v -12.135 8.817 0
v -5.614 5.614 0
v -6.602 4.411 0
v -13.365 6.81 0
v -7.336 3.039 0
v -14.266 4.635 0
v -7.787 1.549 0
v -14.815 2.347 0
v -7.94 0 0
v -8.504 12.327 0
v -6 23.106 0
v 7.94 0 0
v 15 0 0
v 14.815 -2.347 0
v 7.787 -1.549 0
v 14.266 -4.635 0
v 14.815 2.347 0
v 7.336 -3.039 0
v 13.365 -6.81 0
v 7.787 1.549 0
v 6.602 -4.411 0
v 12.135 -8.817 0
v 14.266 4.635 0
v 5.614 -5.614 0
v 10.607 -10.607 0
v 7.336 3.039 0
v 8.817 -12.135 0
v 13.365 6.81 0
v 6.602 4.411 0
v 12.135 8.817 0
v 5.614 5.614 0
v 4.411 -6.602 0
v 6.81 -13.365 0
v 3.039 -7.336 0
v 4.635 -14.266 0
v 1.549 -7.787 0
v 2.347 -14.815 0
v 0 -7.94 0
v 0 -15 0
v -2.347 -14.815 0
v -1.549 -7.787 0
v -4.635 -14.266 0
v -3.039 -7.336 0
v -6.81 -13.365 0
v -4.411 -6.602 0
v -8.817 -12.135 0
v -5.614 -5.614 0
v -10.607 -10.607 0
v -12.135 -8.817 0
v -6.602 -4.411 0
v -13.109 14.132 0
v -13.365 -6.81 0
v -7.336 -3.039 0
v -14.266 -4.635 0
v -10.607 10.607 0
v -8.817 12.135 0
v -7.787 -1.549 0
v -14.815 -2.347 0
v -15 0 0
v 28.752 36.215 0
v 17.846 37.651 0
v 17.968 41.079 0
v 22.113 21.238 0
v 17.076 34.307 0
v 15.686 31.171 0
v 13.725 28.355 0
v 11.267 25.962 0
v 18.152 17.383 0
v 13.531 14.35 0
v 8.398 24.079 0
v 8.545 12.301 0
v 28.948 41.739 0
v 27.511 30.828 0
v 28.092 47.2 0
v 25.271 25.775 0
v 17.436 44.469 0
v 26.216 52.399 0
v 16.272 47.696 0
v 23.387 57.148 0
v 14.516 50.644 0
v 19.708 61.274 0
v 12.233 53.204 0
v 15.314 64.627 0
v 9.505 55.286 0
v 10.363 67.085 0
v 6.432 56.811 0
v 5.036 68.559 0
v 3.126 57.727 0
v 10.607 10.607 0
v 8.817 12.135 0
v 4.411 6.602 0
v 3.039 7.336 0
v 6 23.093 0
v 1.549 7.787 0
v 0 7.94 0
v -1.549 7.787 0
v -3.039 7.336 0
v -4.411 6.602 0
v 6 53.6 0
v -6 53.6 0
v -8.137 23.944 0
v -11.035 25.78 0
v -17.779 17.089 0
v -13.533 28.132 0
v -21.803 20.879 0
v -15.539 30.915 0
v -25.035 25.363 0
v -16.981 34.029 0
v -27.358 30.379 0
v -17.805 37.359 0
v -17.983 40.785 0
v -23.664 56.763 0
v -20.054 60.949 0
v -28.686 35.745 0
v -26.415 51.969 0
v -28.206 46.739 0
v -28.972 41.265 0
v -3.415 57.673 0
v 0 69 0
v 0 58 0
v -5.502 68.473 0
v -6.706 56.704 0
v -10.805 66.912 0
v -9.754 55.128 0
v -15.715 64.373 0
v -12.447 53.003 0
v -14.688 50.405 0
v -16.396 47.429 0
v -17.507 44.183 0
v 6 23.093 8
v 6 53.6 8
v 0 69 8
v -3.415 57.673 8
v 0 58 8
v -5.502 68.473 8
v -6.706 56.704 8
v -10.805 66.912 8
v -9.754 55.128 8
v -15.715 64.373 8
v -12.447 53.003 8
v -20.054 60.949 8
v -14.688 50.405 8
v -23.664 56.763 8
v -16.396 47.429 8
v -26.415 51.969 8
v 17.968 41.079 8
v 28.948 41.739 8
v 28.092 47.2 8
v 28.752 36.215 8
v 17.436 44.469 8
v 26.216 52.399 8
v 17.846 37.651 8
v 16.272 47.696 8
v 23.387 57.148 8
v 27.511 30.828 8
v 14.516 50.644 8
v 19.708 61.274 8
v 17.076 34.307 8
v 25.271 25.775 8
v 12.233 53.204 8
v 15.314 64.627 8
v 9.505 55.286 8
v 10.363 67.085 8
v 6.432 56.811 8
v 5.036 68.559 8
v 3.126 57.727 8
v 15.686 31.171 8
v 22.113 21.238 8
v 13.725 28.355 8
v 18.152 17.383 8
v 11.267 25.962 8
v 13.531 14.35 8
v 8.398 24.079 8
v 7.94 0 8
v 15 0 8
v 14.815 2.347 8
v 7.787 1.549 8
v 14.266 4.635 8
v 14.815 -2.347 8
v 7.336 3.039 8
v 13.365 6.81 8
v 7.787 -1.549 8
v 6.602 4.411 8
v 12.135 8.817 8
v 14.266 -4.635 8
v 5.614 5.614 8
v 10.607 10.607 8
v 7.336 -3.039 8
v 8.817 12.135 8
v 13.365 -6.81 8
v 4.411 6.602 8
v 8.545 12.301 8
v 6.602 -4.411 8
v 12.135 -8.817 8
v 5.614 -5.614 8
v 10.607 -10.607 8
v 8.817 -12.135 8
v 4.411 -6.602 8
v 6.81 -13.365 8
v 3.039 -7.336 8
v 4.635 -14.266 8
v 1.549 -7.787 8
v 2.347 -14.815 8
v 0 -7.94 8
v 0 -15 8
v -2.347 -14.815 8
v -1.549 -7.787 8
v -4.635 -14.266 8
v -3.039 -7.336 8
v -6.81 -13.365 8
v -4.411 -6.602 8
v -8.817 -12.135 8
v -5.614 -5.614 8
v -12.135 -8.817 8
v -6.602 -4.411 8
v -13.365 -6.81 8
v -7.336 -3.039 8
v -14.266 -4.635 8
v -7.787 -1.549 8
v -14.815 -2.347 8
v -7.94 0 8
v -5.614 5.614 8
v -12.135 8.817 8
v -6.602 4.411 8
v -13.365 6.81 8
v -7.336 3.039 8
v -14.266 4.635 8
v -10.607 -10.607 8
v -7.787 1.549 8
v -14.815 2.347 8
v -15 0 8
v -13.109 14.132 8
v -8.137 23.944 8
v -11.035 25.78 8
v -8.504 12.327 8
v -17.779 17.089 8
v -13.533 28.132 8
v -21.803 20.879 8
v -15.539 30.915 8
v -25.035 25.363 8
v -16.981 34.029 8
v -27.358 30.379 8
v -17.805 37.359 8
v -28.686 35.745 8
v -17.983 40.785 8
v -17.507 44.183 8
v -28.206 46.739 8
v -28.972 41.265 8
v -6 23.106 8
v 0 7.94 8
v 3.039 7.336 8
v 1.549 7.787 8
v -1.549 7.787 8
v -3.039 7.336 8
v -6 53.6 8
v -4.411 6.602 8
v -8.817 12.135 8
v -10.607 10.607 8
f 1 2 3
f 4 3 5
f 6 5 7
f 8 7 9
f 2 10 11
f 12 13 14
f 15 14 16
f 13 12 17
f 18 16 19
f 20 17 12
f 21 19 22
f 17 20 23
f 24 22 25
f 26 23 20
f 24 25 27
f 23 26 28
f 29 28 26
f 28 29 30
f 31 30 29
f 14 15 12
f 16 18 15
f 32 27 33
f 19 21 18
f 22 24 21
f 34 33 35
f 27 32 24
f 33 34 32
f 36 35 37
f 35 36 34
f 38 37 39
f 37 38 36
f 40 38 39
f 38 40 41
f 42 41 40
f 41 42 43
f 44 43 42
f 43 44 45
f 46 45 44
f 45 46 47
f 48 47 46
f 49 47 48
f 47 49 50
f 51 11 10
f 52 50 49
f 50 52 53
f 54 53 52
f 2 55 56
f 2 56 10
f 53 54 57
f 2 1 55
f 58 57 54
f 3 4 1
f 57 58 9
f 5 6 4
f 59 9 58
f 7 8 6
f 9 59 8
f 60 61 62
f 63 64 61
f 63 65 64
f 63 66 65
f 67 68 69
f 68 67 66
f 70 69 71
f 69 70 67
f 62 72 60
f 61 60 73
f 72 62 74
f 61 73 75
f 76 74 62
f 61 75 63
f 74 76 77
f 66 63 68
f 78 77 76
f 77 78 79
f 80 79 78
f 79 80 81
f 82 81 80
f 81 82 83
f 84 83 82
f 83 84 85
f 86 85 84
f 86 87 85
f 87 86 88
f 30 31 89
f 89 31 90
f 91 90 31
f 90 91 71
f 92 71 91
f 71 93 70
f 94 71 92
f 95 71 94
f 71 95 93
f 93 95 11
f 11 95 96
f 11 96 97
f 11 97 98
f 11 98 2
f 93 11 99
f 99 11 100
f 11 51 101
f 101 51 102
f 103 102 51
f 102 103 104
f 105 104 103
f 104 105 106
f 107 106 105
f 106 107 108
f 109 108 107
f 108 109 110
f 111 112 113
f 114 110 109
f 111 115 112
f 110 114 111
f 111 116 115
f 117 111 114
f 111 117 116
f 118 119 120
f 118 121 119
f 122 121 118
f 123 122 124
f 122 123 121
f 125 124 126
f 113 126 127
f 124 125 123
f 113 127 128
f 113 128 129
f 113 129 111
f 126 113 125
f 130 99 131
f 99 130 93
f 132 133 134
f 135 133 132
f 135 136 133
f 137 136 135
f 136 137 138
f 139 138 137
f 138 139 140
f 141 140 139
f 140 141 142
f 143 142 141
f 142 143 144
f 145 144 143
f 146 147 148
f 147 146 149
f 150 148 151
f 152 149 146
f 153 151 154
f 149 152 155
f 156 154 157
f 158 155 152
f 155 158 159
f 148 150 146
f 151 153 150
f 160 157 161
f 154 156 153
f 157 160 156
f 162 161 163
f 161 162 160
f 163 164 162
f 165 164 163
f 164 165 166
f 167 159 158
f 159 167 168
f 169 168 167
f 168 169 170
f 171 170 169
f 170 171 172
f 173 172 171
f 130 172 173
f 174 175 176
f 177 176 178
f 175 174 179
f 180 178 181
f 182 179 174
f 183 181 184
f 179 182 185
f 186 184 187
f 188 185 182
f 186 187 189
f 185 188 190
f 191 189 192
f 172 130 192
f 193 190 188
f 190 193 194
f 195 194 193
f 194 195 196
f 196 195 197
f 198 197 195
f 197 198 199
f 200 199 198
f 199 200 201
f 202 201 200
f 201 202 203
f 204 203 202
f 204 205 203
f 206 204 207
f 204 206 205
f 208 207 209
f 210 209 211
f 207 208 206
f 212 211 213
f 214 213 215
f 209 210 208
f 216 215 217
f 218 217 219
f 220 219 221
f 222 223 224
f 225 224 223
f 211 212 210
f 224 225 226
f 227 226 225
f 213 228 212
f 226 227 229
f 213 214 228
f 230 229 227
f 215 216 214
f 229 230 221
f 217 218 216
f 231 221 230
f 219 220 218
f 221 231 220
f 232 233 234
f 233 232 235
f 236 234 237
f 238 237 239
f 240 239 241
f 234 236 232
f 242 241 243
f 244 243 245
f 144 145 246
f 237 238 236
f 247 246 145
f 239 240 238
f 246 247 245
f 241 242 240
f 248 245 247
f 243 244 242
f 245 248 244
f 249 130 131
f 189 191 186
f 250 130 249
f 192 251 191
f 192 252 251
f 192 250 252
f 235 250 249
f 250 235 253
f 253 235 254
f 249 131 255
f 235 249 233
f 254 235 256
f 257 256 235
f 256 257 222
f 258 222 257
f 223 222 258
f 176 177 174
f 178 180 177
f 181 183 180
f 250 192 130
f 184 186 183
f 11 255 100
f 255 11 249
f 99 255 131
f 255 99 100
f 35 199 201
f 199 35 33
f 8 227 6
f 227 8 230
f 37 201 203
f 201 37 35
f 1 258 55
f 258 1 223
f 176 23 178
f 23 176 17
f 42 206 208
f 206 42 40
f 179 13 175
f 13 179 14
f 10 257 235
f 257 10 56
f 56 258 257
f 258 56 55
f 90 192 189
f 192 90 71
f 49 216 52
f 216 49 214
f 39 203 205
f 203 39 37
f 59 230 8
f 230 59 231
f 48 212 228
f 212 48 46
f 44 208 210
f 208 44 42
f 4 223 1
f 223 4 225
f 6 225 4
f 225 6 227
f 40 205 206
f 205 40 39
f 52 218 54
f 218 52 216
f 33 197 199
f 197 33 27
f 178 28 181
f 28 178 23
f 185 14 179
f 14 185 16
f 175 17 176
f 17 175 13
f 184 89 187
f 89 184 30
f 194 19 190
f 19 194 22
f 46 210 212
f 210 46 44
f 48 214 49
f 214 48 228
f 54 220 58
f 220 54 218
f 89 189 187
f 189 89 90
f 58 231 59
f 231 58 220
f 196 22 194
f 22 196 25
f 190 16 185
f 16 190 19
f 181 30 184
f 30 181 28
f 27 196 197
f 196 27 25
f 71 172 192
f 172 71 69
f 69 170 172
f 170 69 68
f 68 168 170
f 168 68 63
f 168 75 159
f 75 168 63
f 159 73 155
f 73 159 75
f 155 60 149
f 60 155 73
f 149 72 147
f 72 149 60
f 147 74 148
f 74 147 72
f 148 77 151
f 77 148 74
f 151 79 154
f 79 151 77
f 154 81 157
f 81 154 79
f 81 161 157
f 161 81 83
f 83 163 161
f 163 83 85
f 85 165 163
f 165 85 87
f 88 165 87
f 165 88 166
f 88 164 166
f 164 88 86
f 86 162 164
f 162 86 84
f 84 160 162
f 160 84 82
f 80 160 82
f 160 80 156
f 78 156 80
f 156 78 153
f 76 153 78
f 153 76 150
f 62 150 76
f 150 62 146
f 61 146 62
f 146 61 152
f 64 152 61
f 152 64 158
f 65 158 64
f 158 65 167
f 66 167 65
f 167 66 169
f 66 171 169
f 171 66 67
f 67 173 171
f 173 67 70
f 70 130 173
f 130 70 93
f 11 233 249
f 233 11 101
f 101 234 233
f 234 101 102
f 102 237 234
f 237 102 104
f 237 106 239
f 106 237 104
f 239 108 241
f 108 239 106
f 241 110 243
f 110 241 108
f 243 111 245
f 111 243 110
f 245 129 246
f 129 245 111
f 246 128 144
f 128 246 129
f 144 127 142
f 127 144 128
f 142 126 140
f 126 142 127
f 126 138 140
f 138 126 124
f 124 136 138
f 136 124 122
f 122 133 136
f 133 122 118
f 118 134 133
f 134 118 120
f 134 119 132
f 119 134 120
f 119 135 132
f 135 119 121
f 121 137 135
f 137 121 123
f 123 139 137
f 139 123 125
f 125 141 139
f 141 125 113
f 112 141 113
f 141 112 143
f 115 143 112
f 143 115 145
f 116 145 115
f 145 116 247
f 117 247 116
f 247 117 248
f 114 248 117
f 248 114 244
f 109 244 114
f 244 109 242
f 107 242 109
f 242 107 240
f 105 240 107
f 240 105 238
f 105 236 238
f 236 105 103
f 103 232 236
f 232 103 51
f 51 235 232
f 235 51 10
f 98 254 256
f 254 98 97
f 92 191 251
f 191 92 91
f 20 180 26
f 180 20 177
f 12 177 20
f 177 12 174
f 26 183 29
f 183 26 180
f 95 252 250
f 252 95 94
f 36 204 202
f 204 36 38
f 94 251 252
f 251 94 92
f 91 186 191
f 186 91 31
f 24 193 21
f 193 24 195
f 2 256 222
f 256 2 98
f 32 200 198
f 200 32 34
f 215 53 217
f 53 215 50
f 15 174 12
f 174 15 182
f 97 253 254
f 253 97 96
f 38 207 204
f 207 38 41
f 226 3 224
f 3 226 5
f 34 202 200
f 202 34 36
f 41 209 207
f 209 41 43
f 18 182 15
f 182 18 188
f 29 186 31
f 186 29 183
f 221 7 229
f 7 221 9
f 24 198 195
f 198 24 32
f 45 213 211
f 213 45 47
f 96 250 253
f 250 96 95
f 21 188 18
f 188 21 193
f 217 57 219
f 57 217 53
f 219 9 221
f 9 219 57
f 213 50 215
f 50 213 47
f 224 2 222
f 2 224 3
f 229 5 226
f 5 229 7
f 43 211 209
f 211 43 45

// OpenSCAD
$fn = 32;

// ----------------------------------------------------------------------
// Hook: 80 mm shank into a 18 mm curl, 8 mm thick
// ----------------------------------------------------------------------

// --- parameters (mm) ---
shank_len = 80;           // shank length from the boss centre
shank_w = 12;             // shank width
boss_d = 30;              // boss diameter
bore_d = 15.88;           // boss bore
curl_in = 18;             // curl inner radius
curl_out = 29;            // curl outer radius
curl_sweep = 350;         // curl sweep angle
hook_t = 8;               // hook thickness

shank_profile = [[-6, 53.6], [6, 53.6], [6, 13], [-6, 13]];
boss_profile = [[15, 0], [14.815, 2.347], [14.266, 4.635], [13.365, 6.81], [12.135, 8.817], [10.607, 10.607], [8.817, 12.135], [6.81, 13.365], [4.635, 14.266], [2.347, 14.815], [0, 15], [-2.347, 14.815], [-4.635, 14.266], [-6.81, 13.365], [-8.817, 12.135], [-10.607, 10.607], [-12.135, 8.817], [-13.365, 6.81], [-14.266, 4.635], [-14.815, 2.347], [-15, 0], [-14.815, -2.347], [-14.266, -4.635], [-13.365, -6.81], [-12.135, -8.817], [-10.607, -10.607], [-8.817, -12.135], [-6.81, -13.365], [-4.635, -14.266], [-2.347, -14.815], [0, -15], [2.347, -14.815], [4.635, -14.266], [6.81, -13.365], [8.817, -12.135], [10.607, -10.607], [12.135, -8.817], [13.365, -6.81], [14.266, -4.635], [14.815, -2.347]];
curl_profile = [[0, 69], [-5.502, 68.473], [-10.805, 66.912], [-15.715, 64.373], [-20.054, 60.949], [-23.664, 56.763], [-26.415, 51.969], [-28.206, 46.739], [-28.972, 41.265], [-28.686, 35.745], [-27.358, 30.379], [-25.035, 25.363], [-21.803, 20.879], [-17.779, 17.089], [-13.109, 14.132], [-7.963, 12.115], [-2.528, 11.11], [3, 11.156], [8.418, 12.249], [13.531, 14.35], [18.152, 17.383], [22.113, 21.238], [25.271, 25.775], [27.511, 30.828], [28.752, 36.215], [28.948, 41.739], [28.092, 47.2], [26.216, 52.399], [23.387, 57.148], [19.708, 61.274], [15.314, 64.627], [10.363, 67.085], [5.036, 68.559], [3.126, 57.727], [6.432, 56.811], [9.505, 55.286], [12.233, 53.204], [14.516, 50.644], [16.272, 47.696], [17.436, 44.469], [17.968, 41.079], [17.846, 37.651], [17.076, 34.307], [15.686, 31.171], [13.725, 28.355], [11.267, 25.962], [8.398, 24.079], [5.225, 22.775], [1.862, 22.097], [-1.569, 22.068], [-4.943, 22.692], [-8.137, 23.944], [-11.035, 25.78], [-13.533, 28.132], [-15.539, 30.915], [-16.981, 34.029], [-17.805, 37.359], [-17.983, 40.785], [-17.507, 44.183], [-16.396, 47.429], [-14.688, 50.405], [-12.447, 53.003], [-9.754, 55.128], [-6.706, 56.704], [-3.415, 57.673], [0, 58]];

difference() {
  union() {
    /* three overlapping outlines: shank, boss and the smooth curl */
    linear_extrude(height = hook_t) polygon(shank_profile);
    linear_extrude(height = hook_t) polygon(boss_profile);
    linear_extrude(height = hook_t) polygon(curl_profile);
  }
  translate([0, 0, -2.5]) cylinder(h = hook_t + 5, d = bore_d);
}
